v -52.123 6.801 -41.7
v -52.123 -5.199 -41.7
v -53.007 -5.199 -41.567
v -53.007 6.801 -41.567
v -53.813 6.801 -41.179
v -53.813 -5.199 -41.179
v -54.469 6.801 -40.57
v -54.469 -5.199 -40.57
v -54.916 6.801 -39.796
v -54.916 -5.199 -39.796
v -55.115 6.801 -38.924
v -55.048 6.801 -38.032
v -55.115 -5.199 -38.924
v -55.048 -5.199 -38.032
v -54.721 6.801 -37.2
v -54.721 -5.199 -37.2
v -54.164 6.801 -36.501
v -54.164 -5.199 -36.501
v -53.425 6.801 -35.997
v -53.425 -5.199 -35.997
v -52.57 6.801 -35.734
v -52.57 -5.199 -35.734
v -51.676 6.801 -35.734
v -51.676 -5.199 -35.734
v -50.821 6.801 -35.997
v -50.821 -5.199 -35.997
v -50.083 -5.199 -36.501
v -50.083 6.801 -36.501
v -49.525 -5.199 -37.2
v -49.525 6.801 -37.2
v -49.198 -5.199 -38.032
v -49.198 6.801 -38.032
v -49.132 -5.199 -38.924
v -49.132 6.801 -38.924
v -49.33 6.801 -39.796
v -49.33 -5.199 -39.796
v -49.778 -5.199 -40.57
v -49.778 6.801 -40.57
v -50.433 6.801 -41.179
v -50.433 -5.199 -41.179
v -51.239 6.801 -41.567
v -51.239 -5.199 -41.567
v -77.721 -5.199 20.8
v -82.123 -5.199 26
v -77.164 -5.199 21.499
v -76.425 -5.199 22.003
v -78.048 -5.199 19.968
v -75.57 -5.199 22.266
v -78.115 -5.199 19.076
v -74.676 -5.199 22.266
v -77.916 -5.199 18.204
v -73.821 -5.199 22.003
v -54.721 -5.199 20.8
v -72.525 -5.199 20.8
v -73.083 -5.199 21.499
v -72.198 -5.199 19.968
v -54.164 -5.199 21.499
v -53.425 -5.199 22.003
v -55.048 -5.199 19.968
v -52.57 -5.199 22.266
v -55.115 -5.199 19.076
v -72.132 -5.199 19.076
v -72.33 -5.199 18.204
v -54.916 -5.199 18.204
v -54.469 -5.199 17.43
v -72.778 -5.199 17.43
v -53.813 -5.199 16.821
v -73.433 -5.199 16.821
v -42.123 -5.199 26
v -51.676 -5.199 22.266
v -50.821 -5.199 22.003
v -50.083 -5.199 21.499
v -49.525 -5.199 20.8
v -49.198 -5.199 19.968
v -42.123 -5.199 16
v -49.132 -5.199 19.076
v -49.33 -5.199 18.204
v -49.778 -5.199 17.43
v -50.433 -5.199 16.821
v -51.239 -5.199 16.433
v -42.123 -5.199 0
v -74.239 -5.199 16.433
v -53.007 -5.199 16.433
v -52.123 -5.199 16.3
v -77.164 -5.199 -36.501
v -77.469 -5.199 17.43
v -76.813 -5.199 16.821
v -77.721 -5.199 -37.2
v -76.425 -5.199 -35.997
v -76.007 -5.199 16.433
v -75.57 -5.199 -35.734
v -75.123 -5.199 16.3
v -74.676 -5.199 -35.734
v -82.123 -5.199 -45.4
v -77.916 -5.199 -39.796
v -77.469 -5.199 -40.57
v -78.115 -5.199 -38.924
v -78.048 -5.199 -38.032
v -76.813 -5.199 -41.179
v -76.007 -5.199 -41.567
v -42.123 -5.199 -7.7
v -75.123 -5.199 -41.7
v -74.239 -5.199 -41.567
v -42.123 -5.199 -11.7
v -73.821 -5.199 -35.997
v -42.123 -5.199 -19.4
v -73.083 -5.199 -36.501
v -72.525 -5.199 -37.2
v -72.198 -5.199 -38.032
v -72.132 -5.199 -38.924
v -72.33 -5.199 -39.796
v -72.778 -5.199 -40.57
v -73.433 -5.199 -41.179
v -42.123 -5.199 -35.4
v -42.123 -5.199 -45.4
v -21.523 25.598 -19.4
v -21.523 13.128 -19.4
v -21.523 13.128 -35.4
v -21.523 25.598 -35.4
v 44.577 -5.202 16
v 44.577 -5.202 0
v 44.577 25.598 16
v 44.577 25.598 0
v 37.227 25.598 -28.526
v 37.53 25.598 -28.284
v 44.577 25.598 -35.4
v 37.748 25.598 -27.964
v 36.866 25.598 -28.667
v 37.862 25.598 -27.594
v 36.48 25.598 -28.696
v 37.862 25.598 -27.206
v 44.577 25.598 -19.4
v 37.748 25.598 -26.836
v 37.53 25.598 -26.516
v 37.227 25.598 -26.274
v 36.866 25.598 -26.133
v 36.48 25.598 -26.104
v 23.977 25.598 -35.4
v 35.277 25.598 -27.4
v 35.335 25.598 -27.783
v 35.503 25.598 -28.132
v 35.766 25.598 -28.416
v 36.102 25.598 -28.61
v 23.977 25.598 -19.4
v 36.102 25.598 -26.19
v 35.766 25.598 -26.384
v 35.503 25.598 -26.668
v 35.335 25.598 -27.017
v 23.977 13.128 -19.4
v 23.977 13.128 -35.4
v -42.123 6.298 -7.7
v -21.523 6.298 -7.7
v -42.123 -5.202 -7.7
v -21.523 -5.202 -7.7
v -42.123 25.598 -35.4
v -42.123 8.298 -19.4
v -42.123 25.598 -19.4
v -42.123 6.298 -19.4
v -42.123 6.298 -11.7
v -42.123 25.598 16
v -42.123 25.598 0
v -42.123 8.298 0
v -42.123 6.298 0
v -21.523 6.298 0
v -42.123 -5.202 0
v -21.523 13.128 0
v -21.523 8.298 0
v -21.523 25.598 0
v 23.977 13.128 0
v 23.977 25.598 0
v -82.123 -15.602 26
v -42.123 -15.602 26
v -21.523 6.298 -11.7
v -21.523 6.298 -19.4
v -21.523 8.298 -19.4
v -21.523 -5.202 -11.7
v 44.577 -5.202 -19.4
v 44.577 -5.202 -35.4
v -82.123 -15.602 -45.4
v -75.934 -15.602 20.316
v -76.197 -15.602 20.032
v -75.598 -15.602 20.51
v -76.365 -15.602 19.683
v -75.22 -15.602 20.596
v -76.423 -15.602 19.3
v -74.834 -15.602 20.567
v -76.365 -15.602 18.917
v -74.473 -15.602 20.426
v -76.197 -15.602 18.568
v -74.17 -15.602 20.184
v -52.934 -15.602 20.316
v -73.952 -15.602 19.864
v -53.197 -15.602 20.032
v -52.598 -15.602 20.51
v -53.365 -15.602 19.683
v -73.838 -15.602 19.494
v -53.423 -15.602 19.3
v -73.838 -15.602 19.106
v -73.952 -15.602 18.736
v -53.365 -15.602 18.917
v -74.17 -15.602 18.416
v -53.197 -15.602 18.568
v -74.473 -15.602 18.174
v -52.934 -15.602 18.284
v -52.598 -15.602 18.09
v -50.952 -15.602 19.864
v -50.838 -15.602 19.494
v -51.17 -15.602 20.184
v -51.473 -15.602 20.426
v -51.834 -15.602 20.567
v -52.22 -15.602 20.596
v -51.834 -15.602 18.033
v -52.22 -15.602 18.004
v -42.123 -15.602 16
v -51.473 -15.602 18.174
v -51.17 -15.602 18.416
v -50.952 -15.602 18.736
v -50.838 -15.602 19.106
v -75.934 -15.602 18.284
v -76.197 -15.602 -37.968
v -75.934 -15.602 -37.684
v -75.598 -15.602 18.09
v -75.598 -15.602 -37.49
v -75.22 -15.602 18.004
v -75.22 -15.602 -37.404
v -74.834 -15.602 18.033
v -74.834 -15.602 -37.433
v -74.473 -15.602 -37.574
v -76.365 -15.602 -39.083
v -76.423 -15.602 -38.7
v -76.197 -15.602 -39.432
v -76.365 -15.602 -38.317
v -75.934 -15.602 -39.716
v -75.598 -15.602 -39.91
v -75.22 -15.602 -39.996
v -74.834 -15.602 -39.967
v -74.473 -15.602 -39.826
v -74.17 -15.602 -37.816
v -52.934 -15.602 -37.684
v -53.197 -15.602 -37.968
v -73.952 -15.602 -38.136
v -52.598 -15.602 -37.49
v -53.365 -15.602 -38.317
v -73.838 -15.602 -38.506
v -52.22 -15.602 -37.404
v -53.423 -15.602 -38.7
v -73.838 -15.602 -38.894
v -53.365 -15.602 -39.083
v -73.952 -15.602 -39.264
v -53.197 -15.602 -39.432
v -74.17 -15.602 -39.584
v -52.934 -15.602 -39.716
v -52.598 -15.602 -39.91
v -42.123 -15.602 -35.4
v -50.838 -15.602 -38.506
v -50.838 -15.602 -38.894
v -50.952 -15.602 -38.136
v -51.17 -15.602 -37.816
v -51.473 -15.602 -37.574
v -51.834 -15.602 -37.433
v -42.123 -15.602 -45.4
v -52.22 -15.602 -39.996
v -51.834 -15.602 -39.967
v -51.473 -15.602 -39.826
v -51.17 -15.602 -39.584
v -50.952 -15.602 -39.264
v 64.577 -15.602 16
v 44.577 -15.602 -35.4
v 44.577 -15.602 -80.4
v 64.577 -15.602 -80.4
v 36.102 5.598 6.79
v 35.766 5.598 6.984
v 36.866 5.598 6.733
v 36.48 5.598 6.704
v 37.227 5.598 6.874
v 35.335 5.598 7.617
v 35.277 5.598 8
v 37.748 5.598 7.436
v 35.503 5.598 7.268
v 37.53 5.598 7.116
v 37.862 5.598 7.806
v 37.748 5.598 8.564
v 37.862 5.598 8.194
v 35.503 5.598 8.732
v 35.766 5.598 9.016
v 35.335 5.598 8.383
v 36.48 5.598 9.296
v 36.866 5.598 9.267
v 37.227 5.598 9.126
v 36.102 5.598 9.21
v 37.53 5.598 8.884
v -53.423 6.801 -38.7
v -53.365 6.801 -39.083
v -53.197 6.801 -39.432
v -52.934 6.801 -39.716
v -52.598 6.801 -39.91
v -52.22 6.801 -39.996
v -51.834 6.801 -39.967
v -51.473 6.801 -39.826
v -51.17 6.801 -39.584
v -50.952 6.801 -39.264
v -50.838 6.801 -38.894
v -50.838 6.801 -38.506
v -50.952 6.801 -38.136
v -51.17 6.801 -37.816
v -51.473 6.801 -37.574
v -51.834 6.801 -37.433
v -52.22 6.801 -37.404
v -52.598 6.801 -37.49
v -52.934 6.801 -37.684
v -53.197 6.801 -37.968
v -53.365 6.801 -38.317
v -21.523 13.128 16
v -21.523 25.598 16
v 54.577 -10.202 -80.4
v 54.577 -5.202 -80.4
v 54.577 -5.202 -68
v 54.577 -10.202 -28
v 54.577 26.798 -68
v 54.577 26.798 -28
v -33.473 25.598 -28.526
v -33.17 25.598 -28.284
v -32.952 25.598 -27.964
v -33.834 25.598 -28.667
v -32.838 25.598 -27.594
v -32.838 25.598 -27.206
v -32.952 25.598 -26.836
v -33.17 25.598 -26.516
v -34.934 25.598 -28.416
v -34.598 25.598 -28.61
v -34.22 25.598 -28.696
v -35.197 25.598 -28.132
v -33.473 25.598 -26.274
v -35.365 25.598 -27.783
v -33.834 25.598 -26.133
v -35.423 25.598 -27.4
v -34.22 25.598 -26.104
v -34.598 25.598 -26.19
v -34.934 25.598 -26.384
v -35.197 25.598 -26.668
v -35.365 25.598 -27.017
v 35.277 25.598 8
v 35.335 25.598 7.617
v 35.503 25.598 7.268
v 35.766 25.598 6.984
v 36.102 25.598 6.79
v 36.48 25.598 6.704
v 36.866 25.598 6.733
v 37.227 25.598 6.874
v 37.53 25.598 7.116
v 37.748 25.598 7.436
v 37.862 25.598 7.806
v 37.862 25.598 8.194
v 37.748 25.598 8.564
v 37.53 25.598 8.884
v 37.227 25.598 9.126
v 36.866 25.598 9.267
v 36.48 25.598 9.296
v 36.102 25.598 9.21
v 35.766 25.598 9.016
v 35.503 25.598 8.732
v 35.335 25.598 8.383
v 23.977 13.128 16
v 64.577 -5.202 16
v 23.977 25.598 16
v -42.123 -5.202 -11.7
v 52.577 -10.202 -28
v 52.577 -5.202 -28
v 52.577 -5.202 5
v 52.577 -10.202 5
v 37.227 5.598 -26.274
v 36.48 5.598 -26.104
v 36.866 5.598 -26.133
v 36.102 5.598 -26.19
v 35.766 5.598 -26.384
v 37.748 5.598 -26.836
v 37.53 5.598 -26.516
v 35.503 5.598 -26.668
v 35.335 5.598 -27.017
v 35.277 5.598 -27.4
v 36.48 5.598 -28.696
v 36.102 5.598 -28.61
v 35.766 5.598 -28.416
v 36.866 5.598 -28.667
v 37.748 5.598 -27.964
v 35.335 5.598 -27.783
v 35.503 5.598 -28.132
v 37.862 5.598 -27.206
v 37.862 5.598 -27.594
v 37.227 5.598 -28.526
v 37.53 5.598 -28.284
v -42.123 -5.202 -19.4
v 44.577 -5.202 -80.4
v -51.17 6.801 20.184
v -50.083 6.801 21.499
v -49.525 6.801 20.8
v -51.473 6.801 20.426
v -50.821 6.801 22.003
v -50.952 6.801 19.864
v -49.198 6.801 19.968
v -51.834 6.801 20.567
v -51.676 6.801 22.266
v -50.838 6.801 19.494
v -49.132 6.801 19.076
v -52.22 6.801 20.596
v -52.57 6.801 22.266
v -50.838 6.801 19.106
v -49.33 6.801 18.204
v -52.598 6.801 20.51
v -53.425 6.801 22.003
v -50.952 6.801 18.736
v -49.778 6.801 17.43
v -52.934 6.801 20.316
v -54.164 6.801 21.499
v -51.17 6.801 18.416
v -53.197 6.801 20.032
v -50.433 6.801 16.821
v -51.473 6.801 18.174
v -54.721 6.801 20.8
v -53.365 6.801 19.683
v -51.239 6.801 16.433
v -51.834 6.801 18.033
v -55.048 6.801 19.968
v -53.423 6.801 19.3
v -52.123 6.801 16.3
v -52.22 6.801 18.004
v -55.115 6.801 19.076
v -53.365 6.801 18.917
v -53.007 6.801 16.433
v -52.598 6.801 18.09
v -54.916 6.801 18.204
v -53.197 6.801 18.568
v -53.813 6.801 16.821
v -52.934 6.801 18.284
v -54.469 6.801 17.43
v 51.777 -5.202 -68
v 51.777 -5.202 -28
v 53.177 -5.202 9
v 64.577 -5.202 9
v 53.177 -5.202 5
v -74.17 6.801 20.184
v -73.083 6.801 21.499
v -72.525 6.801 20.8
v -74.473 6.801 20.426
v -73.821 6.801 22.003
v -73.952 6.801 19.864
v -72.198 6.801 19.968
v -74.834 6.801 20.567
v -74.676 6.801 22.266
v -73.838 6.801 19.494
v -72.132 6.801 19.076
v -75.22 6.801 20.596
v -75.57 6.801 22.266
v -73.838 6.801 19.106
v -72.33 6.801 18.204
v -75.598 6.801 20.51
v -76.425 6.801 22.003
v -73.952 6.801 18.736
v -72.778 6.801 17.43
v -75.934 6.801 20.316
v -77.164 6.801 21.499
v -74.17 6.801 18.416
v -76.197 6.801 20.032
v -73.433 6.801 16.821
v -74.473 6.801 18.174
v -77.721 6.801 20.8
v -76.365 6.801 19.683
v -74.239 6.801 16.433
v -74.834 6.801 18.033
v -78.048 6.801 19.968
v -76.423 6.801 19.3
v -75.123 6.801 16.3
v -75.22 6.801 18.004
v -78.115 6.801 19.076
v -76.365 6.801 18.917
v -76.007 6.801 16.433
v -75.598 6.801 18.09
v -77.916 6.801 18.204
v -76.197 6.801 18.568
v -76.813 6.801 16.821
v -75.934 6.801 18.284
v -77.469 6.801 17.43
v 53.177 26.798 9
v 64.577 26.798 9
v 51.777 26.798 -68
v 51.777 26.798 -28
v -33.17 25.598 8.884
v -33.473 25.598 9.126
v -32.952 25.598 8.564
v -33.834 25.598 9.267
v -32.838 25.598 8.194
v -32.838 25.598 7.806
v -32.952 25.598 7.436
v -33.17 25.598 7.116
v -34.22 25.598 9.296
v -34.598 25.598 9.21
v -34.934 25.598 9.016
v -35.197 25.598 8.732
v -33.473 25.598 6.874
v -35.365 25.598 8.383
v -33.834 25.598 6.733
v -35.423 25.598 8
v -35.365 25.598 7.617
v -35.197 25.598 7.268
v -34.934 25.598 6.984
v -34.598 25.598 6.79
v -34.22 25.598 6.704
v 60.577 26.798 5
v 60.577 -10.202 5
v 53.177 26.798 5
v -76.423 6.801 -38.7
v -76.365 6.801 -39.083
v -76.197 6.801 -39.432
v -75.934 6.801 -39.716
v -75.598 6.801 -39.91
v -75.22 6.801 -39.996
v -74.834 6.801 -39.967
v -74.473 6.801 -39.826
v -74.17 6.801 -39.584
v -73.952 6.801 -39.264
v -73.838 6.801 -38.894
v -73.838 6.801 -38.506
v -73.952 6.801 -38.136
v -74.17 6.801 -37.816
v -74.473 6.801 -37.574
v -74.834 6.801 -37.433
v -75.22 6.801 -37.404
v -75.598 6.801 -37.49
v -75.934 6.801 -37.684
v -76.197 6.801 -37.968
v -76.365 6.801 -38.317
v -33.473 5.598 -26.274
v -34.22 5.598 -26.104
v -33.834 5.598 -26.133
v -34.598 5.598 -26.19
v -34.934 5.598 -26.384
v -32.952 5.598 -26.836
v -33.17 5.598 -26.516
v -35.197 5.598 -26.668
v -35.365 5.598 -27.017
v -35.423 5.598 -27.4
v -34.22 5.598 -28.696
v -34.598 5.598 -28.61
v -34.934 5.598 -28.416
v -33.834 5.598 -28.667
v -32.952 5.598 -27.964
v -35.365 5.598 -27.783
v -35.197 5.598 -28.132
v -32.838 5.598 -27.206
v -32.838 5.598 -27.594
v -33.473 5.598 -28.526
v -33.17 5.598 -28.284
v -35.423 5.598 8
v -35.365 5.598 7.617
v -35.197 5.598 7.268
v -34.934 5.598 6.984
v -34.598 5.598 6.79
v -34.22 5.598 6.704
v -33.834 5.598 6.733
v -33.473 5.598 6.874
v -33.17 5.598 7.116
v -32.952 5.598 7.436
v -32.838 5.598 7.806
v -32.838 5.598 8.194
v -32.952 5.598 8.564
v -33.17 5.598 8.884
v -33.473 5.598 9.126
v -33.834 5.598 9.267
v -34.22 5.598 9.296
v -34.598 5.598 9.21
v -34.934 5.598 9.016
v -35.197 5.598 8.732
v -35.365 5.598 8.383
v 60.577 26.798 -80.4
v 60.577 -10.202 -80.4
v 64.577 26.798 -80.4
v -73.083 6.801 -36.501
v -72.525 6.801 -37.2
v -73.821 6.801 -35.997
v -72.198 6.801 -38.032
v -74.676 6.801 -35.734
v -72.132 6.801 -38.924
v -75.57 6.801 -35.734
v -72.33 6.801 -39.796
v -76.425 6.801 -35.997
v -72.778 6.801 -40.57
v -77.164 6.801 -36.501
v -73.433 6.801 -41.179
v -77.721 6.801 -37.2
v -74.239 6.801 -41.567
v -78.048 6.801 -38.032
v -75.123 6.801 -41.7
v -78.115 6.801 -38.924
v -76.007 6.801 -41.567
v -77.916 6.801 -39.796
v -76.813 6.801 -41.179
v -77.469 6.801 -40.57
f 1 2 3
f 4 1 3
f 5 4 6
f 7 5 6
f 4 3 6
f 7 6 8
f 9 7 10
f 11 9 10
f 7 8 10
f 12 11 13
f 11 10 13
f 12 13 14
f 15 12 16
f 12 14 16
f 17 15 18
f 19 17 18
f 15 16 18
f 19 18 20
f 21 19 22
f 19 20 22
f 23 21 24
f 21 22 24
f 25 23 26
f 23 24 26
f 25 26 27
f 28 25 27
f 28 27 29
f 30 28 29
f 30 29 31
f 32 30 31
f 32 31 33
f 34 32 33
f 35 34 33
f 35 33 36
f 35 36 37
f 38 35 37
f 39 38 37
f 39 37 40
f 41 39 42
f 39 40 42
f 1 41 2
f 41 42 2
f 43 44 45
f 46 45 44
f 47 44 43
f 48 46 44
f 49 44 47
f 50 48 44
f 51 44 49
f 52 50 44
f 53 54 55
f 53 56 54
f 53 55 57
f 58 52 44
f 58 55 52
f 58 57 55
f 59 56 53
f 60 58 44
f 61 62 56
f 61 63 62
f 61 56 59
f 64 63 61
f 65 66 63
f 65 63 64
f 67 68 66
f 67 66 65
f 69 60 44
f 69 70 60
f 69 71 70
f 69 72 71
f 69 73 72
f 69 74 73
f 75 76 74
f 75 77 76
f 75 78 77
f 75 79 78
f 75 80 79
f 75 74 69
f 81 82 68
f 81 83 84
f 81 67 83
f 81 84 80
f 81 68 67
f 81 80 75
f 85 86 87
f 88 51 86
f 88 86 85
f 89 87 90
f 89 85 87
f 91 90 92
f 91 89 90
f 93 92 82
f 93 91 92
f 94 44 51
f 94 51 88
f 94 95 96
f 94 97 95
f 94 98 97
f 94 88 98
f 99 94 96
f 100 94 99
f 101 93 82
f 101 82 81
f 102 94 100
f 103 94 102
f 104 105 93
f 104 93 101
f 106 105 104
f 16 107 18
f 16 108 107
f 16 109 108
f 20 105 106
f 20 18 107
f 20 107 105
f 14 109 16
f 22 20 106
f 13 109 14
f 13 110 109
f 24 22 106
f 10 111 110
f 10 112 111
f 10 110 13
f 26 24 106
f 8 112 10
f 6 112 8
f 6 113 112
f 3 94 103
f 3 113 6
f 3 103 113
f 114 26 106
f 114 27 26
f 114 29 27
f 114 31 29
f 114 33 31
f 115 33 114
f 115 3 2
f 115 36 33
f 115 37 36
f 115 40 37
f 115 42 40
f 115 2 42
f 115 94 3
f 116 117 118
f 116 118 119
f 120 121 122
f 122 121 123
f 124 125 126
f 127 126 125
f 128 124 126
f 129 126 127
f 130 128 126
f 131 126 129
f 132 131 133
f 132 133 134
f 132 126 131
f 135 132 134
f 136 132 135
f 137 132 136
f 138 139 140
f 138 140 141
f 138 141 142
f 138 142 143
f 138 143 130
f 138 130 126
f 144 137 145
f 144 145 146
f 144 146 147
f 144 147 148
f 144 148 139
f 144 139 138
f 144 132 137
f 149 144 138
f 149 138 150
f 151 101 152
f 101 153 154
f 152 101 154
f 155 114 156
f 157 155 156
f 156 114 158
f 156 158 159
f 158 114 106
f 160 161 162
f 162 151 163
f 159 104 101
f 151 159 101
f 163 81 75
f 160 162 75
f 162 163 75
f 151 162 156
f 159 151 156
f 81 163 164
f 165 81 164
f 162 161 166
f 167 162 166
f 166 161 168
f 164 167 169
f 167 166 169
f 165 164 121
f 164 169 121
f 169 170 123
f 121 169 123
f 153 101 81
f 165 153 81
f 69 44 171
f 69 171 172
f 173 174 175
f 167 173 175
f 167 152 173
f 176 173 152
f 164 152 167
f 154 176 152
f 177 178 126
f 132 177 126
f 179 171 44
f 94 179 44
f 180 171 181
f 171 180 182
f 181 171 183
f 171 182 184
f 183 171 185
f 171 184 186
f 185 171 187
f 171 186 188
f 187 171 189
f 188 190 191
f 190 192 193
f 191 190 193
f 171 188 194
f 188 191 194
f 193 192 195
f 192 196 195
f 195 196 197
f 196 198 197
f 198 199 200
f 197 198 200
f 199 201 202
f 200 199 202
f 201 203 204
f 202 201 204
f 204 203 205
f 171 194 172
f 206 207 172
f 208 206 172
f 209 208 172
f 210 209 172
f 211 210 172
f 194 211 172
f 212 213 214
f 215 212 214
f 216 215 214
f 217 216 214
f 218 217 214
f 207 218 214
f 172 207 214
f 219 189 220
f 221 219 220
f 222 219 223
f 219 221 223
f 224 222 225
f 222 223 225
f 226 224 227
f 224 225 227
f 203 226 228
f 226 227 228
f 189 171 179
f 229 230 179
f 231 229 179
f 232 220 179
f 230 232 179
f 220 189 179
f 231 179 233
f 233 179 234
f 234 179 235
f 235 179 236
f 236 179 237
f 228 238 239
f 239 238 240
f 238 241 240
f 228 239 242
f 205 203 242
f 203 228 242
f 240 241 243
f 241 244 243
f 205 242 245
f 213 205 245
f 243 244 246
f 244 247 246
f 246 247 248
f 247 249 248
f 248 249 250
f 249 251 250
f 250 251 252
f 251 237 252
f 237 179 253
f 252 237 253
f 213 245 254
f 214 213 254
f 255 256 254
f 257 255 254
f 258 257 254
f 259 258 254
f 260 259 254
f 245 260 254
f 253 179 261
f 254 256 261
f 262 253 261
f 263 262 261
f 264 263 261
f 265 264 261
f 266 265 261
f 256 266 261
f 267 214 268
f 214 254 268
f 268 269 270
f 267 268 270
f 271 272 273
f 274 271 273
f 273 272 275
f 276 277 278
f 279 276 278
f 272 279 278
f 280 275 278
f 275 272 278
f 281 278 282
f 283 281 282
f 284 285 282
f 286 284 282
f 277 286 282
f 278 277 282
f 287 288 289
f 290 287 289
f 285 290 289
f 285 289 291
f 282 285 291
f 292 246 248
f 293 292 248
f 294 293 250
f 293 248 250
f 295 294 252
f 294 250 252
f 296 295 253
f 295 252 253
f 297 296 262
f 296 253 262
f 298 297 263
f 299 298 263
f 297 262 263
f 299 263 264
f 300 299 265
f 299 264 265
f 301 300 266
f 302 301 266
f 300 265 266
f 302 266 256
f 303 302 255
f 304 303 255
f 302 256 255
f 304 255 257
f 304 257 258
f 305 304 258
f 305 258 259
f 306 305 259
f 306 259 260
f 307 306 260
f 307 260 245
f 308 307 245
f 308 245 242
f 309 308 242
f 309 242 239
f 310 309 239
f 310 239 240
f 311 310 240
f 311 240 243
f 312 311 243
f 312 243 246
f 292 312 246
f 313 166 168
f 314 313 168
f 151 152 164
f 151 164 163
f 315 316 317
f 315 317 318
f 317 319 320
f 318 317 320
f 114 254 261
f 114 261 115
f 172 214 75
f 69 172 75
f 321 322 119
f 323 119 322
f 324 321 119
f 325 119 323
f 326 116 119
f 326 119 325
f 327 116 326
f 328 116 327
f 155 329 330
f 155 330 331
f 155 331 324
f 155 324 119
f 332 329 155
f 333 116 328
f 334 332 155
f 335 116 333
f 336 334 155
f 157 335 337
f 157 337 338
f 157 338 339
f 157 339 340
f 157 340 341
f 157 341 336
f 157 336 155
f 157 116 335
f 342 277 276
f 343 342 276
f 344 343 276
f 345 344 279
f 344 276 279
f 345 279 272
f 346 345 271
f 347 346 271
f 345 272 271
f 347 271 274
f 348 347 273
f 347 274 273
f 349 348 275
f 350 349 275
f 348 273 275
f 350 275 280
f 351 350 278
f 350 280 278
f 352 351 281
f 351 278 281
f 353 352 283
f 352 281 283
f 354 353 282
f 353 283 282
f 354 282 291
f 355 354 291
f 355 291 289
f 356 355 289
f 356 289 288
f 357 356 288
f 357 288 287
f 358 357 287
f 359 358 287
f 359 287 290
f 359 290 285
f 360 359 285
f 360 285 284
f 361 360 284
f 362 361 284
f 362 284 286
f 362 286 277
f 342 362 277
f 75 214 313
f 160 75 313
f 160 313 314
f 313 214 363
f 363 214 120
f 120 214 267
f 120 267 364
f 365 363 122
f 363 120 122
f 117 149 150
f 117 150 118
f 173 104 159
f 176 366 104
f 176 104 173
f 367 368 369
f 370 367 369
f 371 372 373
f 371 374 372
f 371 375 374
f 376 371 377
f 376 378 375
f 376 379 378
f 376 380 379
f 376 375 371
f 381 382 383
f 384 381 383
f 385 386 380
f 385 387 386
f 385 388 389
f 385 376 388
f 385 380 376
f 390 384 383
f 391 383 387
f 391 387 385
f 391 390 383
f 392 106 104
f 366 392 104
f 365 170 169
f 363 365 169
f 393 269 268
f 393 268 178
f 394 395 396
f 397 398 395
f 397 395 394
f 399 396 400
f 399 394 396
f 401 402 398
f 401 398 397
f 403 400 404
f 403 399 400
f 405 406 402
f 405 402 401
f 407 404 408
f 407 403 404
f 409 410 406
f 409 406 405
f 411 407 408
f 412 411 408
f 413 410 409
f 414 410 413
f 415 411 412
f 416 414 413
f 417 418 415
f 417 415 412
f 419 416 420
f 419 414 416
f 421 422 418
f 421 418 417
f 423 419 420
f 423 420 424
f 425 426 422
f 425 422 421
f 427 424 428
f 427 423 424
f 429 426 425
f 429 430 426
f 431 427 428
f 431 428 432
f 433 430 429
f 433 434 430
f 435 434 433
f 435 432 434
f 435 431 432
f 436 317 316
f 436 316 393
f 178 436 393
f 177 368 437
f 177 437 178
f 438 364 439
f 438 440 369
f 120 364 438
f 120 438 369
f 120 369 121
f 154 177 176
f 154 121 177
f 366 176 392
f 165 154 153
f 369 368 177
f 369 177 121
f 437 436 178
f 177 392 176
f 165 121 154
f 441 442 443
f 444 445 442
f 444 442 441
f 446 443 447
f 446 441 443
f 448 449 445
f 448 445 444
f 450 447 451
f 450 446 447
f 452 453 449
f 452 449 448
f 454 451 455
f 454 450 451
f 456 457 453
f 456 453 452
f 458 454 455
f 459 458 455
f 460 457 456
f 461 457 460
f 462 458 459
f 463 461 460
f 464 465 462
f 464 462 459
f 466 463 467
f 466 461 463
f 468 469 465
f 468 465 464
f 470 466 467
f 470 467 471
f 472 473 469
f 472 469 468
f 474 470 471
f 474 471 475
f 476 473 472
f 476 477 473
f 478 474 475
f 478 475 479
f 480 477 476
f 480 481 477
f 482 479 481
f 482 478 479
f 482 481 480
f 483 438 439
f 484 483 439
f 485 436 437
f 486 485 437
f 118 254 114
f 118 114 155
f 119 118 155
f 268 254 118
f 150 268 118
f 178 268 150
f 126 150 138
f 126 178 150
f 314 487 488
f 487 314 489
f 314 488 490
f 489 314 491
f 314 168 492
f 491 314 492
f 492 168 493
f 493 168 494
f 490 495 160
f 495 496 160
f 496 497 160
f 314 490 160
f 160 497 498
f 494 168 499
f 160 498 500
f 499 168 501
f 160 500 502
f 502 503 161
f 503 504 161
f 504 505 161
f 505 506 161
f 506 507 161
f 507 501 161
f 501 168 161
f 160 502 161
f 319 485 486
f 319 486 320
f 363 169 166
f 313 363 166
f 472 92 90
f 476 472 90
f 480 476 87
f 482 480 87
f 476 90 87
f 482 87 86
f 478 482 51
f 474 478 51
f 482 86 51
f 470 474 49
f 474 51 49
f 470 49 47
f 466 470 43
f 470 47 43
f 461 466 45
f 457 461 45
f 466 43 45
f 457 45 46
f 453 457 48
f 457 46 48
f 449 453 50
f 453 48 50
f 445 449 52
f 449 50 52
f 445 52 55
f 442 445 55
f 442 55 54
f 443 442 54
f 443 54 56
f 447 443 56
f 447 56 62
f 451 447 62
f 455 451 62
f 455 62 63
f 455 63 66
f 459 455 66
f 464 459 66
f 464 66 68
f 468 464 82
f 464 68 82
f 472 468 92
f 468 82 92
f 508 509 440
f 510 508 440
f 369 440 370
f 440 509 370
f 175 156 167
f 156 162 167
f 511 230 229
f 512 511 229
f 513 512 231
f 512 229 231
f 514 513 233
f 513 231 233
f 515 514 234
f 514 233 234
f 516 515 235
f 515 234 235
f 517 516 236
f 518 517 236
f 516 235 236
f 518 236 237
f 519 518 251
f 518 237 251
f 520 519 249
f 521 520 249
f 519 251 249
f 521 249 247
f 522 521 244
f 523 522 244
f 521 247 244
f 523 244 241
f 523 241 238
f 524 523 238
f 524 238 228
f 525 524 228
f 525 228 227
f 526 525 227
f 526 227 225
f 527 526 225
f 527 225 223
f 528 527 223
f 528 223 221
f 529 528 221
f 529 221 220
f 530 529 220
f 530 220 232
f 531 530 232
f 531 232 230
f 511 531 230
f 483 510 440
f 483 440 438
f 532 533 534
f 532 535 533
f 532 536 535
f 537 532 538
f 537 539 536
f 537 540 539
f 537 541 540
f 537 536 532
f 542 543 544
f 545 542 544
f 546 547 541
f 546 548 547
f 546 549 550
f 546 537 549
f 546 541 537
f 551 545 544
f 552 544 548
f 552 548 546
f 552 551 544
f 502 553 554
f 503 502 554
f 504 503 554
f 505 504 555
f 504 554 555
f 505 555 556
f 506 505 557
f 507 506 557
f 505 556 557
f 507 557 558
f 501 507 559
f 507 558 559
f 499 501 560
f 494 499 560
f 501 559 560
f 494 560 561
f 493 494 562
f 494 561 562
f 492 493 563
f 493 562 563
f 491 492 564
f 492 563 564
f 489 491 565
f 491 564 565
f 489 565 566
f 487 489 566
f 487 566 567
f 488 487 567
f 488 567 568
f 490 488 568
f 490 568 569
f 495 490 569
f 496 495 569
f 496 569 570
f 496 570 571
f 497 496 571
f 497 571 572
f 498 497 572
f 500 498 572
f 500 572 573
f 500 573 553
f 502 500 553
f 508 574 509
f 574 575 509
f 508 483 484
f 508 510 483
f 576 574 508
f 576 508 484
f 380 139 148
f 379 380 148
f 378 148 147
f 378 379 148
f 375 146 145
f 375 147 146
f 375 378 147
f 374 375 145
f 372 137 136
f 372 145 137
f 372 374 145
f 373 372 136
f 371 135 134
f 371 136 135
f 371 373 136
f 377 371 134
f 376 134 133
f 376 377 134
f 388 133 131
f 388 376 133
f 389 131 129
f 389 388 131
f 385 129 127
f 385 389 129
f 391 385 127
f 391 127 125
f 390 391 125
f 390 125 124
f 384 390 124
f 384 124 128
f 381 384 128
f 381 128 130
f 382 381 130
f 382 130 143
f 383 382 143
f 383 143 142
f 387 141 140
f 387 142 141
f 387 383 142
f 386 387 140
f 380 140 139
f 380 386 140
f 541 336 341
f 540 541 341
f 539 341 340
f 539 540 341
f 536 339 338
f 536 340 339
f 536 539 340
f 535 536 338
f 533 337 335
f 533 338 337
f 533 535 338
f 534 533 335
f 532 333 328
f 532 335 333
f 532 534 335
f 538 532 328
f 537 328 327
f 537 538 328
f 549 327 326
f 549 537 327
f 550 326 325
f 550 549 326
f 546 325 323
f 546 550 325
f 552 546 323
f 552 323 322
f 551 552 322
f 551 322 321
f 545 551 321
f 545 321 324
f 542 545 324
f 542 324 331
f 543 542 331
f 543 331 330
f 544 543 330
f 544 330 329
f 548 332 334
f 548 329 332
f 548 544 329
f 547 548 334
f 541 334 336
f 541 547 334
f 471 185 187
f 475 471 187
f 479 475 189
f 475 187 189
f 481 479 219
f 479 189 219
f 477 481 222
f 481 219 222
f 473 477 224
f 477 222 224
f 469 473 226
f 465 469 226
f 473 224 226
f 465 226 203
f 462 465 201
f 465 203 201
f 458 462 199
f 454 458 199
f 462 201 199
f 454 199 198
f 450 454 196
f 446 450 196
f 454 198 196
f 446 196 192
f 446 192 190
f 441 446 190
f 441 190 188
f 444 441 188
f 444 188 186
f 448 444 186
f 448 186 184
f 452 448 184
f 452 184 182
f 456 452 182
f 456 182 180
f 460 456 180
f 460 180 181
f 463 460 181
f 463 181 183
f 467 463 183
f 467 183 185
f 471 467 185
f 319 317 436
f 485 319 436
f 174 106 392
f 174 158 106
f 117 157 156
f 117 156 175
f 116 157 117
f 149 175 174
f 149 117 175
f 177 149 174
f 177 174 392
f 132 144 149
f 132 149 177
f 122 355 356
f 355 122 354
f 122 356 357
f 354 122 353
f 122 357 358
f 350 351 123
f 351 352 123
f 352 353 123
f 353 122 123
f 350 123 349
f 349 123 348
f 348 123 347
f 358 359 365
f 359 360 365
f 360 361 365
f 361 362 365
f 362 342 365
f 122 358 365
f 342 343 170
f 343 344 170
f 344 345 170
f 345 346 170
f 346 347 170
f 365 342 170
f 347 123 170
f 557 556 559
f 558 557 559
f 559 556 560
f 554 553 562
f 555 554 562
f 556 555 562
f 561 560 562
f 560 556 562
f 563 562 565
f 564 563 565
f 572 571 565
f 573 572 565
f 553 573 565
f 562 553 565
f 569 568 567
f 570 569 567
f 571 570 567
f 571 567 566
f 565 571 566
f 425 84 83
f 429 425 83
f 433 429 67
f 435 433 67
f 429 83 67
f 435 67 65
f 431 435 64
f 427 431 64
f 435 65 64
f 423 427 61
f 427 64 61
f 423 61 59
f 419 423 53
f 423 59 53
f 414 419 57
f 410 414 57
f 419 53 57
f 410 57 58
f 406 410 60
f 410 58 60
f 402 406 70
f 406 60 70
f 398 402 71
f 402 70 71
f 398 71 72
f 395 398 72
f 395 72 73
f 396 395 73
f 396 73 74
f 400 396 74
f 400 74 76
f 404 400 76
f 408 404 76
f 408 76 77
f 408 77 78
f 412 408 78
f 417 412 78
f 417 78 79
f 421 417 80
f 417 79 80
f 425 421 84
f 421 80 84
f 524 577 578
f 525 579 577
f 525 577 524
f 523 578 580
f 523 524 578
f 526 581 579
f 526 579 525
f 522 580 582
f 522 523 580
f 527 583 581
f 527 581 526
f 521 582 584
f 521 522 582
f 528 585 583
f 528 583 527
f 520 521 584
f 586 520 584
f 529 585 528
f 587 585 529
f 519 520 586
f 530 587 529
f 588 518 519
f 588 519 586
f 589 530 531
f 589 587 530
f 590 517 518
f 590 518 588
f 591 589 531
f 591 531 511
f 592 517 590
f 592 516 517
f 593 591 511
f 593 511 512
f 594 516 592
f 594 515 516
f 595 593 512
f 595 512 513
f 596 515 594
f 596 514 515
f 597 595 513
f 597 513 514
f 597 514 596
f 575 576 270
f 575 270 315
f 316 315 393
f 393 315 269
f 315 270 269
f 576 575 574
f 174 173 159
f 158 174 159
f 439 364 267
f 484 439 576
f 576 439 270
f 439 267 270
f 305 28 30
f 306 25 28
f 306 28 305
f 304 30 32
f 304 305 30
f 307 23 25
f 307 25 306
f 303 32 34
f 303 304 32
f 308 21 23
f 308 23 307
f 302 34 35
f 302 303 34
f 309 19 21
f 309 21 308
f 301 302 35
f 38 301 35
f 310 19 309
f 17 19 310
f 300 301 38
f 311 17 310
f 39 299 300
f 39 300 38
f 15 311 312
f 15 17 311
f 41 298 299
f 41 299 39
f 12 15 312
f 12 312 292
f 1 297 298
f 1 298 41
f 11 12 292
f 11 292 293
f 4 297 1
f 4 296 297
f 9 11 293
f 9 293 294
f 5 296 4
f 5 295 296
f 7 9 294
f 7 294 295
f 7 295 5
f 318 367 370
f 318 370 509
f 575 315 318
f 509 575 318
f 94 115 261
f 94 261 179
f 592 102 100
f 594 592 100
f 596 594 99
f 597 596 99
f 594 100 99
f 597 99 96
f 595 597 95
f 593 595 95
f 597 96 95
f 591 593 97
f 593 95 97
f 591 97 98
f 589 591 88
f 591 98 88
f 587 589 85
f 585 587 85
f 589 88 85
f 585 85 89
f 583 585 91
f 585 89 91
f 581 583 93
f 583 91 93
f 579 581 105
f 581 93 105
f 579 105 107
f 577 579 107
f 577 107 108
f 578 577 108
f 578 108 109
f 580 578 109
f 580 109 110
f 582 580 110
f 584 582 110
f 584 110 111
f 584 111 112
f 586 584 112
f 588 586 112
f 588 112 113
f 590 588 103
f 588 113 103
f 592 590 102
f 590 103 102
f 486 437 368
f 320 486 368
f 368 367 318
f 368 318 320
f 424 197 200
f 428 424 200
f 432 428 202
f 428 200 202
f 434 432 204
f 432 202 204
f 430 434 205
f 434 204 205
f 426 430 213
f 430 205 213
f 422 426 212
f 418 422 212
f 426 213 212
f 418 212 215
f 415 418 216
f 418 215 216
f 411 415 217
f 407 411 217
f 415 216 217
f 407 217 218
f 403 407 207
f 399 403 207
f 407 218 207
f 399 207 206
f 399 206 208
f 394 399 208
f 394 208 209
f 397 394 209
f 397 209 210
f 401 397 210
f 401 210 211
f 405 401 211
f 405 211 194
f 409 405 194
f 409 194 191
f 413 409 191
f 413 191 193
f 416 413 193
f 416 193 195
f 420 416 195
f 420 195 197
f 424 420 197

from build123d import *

# Parameters (mm, degrees)
EXTRUDE_1_DEPTH     = 16
F_1_0MM_1_D         = 2.6
F_1_0MM_2_D         = 2.6
SKETCH_8_W          = 86.7
SKETCH_8_H          = 16
EXTRUDE_2_DEPTH     = 21.2
SKETCH_9_W          = 86.7
SKETCH_9_H          = 10.4
EXTRUDE_3_DEPTH     = 9.7
SKETCH_15_W         = 20.6
SKETCH_15_H         = 2
EXTRUDE_8_DEPTH     = 13.5
SKETCH_16_W         = 20.6
SKETCH_16_H         = 2
EXTRUDE_9_DEPTH     = 10.5
SKETCH_19_W         = 51.4
SKETCH_19_H         = 10.4
EXTRUDE_10_DEPTH    = 20
SKETCH_25_W         = 20
SKETCH_25_H         = 10.4
EXTRUDE_11_DEPTH    = 45
EXTRUDE_12_DEPTH    = 32
CUT_EXTRUDE_1_DEPTH = 5
SKETCH_29_W         = 51.4
SKETCH_29_H         = 10.402970243
EXTRUDE_13_DEPTH    = 40
SKETCH_32_W         = 40
SKETCH_32_H         = 10.402970243
EXTRUDE_14_DEPTH    = 10
SKETCH_33_W         = 40
SKETCH_33_H         = 10.402970243
EXTRUDE_15_DEPTH    = 10
SKETCH_34_R         = 3
EXTRUDE_16_DEPTH    = 12
F_1_0MM_3_D         = 2.6
F_1_0MM_4_D         = 2.6


with BuildPart() as part:
    # 草图1 → 凸台-拉伸1 (new body)
    with BuildSketch(Plane.XY):
        Polygon((-21.523113208, 25.59839861), (-42.123113208, 25.59839861), (-42.123113208, 5.59839861), (44.576886792, 5.59839861), (44.576886792, 25.59839861), (23.976886792, 25.59839861), (23.976886792, 13.12839861), (-21.523113208, 13.12839861), align=None)
    extrude_1 = extrude(amount=EXTRUDE_1_DEPTH)

    # Ø1.0mm 暗销孔1 (through all)
    with Locations(Plane(origin=(0, 25.59839861, 0), x_dir=(1, 0, 0), z_dir=(0, 1, 0))):
        with Locations((36.576886792, -8)):
            f_1_0mm_1 = Hole(F_1_0MM_1_D / 2)

    # Ø1.0mm 暗销孔2 (through all)
    with Locations(Plane(origin=(0, 25.59839861, 0), x_dir=(1, 0, 0), z_dir=(0, 1, 0))):
        with Locations((-34.123113208, -8)):
            f_1_0mm_2 = Hole(F_1_0MM_2_D / 2)

    # 草图8 → 凸台-拉伸2 (add)
    with BuildSketch(Plane.XZ.offset(-5.59839861)):
        with Locations((1.226886792, 8)):
            Rectangle(SKETCH_8_W, SKETCH_8_H)
    extrude_2 = extrude(amount=EXTRUDE_2_DEPTH)

    # 草图9 → 凸台-拉伸3 (add)
    with BuildSketch(Plane(origin=(0, 0, 0), x_dir=(-1, 0, 0), z_dir=(0, 0, -1))):
        with Locations((-1.226886792, -10.40160139)):
            Rectangle(SKETCH_9_W, SKETCH_9_H)
    extrude_3 = extrude(amount=EXTRUDE_3_DEPTH)

    # 草图15 → 凸台-拉伸8 (add)
    with BuildSketch(Plane(origin=(0, -5.20160139, 0), x_dir=(1, 0, 0), z_dir=(0, 1, 0))):
        with Locations((-31.823113208, 8.7)):
            Rectangle(SKETCH_15_W, SKETCH_15_H)
    extrude_8 = extrude(amount=EXTRUDE_8_DEPTH)

    # 草图16 → 凸台-拉伸9 (add)
    with BuildSketch(Plane(origin=(0, 0, -9.7), x_dir=(-1, 0, 0), z_dir=(0, 0, -1))):
        with Locations((31.823113208, 7.29839861)):
            Rectangle(SKETCH_16_W, SKETCH_16_H)
    extrude_9 = extrude(amount=-EXTRUDE_9_DEPTH)

    # 镜向20: 凸台-拉伸1, Ø1.0mm 暗销孔1, Ø1.0mm 暗销孔2, 凸台-拉伸2, 凸台-拉伸3, 凸台-拉伸8, 凸台-拉伸9 across plane
    add(extrude_1.mirror(Plane.XY.offset(-9.7)))
    add(f_1_0mm_1.mirror(Plane.XY.offset(-9.7)), mode=Mode.SUBTRACT)
    add(f_1_0mm_2.mirror(Plane.XY.offset(-9.7)), mode=Mode.SUBTRACT)
    add(extrude_2.mirror(Plane.XY.offset(-9.7)))
    add(extrude_3.mirror(Plane.XY.offset(-9.7)))
    add(extrude_8.mirror(Plane.XY.offset(-9.7)))
    add(extrude_9.mirror(Plane.XY.offset(-9.7)))

    # 草图19 → 凸台-拉伸10 (add)
    with BuildSketch(Plane(origin=(44.576886792, 0, 0), x_dir=(0, 0, -1), z_dir=(1, 0, 0))):
        with Locations((9.7, -10.40160139)):
            Rectangle(SKETCH_19_W, SKETCH_19_H)
    extrude(amount=EXTRUDE_10_DEPTH)

    # 草图25 → 凸台-拉伸11 (add)
    with BuildSketch(Plane(origin=(0, 0, -35.4), x_dir=(-1, 0, 0), z_dir=(0, 0, -1))):
        with Locations((-54.576886792, -10.40160139)):
            Rectangle(SKETCH_25_W, SKETCH_25_H)
    extrude(amount=EXTRUDE_11_DEPTH)

    # 草图26 → 凸台-拉伸12 (add)
    with BuildSketch(Plane(origin=(0, -5.20160139, 0), x_dir=(1, 0, 0), z_dir=(0, 1, 0))):
        Polygon((53.176886792, -9), (64.576886792, -9), (64.576886792, -5), (64.576886792, 80.4), (60.576886792, 80.4), (60.576886792, -5), (53.176886792, -5), align=None)
        Polygon((53.176886792, 28), (54.576886792, 28), (54.576886792, 68), (53.176886792, 68), (51.776886792, 68), (51.776886792, 28), align=None)
    extrude(amount=EXTRUDE_12_DEPTH)

    # 草图28 → 切除-拉伸1 (cut)
    with BuildSketch(Plane(origin=(0, -5.20160139, 0), x_dir=(1, 0, 0), z_dir=(0, 1, 0))):
        Polygon((60.576886792, 80.4), (54.576886792, 80.4), (54.576886792, 28), (52.576886792, 28), (52.576886792, -5), (54.576886792, -5), (60.576886792, -5), (60.576886792, 28), align=None)
    extrude(amount=-CUT_EXTRUDE_1_DEPTH, mode=Mode.SUBTRACT)

    # 草图29 → 凸台-拉伸13 (add)
    with BuildSketch(Plane.ZY.offset(42.123113208)):
        with Locations((-9.7, -10.400116268)):
            Rectangle(SKETCH_29_W, SKETCH_29_H)
    extrude(amount=EXTRUDE_13_DEPTH)

    # 草图32 → 凸台-拉伸14 (add)
    with BuildSketch(Plane(origin=(0, 0, -35.4), x_dir=(-1, 0, 0), z_dir=(0, 0, -1))):
        with Locations((62.123113208, -10.400116268)):
            Rectangle(SKETCH_32_W, SKETCH_32_H)
    extrude(amount=EXTRUDE_14_DEPTH)

    # 草图33 → 凸台-拉伸15 (add)
    with BuildSketch(Plane.XY.offset(16)):
        with Locations((-62.123113208, -10.400116268)):
            Rectangle(SKETCH_33_W, SKETCH_33_H)
    extrude(amount=EXTRUDE_15_DEPTH)

    # 草图34 → 凸台-拉伸16 (add)
    with BuildSketch(Plane(origin=(0, -5.198631147, 0), x_dir=(1, 0, 0), z_dir=(0, 1, 0))):
        with Locations(Location((-52.123113208, 38.7, 0), (0, 0, 90))):
            Circle(SKETCH_34_R)
        with Locations(Location((-75.123113208, 38.7, 0), (0, 0, 90))):
            Circle(SKETCH_34_R)
        with Locations(Location((-52.123113208, -19.3, 0), (0, 0, 90))):
            Circle(SKETCH_34_R)
        with Locations(Location((-75.123113208, -19.3, 0), (0, 0, 90))):
            Circle(SKETCH_34_R)
    extrude(amount=EXTRUDE_16_DEPTH)

    # Ø1.0mm 暗销孔3 (through all)
    with Locations(Plane(origin=(0, 6.801368853, 0), x_dir=(1, 0, 0), z_dir=(0, 1, 0))):
        with Locations((-52.123113208, 38.7)):
            Hole(F_1_0MM_3_D / 2)

    # Ø1.0mm 暗销孔4 (through all)
    with Locations(Plane(origin=(0, 6.801368853, 0), x_dir=(1, 0, 0), z_dir=(0, 1, 0))):
        with Locations((-52.123113208, -19.3), (-75.123113208, 38.7), (-75.123113208, -19.3)):
            Hole(F_1_0MM_4_D / 2)


solid = part.part
